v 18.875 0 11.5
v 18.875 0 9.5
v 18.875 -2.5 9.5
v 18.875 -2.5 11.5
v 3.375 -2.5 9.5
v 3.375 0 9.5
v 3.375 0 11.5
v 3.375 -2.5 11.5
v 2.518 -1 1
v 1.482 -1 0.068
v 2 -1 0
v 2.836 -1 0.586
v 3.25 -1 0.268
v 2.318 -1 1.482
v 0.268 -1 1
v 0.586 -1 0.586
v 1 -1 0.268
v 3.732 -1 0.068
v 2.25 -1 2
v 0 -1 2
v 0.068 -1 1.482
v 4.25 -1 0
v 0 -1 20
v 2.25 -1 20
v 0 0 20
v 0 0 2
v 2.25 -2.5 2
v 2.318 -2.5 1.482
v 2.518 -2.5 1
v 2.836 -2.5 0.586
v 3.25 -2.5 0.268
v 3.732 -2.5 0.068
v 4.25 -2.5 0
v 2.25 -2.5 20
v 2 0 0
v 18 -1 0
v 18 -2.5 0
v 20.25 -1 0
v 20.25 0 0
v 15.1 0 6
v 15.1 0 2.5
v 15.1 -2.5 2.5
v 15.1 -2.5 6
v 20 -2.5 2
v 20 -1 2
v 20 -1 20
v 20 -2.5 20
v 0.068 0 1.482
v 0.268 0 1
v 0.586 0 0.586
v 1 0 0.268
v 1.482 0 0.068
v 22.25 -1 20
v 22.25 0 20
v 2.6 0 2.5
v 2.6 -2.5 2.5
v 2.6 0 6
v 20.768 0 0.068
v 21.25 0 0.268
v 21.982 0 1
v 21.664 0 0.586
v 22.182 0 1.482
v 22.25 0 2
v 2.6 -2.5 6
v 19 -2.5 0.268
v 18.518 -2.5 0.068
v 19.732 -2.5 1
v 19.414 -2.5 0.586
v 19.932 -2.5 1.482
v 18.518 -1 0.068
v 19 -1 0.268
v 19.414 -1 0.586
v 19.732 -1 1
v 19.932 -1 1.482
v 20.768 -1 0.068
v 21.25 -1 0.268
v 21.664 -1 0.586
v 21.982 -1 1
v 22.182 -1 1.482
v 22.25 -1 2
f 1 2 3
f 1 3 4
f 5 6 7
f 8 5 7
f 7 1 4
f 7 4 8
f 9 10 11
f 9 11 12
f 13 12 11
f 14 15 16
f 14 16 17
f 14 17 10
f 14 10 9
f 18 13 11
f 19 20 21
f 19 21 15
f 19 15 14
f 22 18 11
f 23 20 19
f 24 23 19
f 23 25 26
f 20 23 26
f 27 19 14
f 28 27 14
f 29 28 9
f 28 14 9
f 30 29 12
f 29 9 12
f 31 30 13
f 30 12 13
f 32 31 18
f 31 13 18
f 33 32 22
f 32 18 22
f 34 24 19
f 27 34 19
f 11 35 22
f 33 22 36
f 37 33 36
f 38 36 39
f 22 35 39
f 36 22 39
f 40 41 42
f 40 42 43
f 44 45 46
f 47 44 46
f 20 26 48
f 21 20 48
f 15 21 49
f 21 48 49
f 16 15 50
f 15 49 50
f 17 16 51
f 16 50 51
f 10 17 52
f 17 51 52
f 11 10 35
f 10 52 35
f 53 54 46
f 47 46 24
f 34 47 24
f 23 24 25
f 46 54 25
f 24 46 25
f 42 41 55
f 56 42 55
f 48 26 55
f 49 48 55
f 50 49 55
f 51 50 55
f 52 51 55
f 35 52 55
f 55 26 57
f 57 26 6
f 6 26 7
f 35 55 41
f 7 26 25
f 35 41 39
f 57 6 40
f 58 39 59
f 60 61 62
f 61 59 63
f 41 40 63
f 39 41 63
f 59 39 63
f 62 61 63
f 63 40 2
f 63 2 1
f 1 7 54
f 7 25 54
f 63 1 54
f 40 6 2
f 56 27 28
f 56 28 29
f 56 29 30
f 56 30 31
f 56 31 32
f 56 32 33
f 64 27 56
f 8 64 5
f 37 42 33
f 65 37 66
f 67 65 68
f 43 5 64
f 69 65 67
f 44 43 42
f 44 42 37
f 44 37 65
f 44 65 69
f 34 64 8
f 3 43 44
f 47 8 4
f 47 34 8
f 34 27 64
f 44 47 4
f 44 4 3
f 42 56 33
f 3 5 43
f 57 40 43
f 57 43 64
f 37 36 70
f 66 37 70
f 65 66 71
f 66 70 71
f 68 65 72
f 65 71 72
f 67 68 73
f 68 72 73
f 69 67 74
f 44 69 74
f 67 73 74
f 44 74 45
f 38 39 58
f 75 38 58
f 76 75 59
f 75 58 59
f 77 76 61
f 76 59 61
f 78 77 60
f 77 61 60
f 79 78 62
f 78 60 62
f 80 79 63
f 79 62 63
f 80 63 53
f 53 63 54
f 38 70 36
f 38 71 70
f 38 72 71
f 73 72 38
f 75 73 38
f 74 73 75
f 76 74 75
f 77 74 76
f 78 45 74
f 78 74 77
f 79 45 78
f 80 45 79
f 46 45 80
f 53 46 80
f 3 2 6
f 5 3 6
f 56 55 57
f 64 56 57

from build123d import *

# Parameters (mm, degrees)
F1_DEPTH = 1
F3_DEPTH = 1.5
F5_W     = 12.5
F5_H     = 3.5
F5_W_2   = 15.5
F5_H_2   = 2
F6_DEPTH = 2.5


with BuildPart() as f1:
    # F0 (on Front) → F1 (new body)
    with BuildSketch(Plane.XZ):
        with BuildLine():
            ThreePointArc((0, 2), (0.585786, 0.585786), (2, 0))
            Line((2, 0), (20.25, 0))
            ThreePointArc((20.25, 0), (21.664214, 0.585786), (22.25, 2))
            Line((22.25, 2), (22.25, 20))
            Line((22.25, 20), (0, 20))
            Line((0, 20), (0, 2))
        make_face()
    extrude(amount=F1_DEPTH)


with BuildPart() as f3:
    # F2 (on face) → F3 (new body)
    with BuildSketch(Plane.XZ.offset(1)):
        with BuildLine():
            Line((20, 20), (2.25, 20))
            Line((2.25, 20), (2.25, 2))
            ThreePointArc((2.25, 2), (2.835786, 0.585786), (4.25, 0))
            Line((4.25, 0), (18, 0))
            ThreePointArc((18, 0), (19.414214, 0.585786), (20, 2))
            Line((20, 2), (20, 20))
        make_face()
    extrude(amount=F3_DEPTH)


with BuildPart() as f1_1:
    add(f1.part)

    # F4: union F3
    add(f3.part)

    # F5 (on face) → F6 (cut, through all)
    with BuildSketch(Plane(origin=(0, 0, 0), x_dir=(-1, 0, 0), z_dir=(0, 1, 0))):
        with Locations((-8.85, 4.25)):
            Rectangle(F5_W, F5_H)
        with Locations((-11.125, 10.5)):
            Rectangle(F5_W_2, F5_H_2)
    extrude(amount=-F6_DEPTH, mode=Mode.SUBTRACT)


solid = f1_1.part
